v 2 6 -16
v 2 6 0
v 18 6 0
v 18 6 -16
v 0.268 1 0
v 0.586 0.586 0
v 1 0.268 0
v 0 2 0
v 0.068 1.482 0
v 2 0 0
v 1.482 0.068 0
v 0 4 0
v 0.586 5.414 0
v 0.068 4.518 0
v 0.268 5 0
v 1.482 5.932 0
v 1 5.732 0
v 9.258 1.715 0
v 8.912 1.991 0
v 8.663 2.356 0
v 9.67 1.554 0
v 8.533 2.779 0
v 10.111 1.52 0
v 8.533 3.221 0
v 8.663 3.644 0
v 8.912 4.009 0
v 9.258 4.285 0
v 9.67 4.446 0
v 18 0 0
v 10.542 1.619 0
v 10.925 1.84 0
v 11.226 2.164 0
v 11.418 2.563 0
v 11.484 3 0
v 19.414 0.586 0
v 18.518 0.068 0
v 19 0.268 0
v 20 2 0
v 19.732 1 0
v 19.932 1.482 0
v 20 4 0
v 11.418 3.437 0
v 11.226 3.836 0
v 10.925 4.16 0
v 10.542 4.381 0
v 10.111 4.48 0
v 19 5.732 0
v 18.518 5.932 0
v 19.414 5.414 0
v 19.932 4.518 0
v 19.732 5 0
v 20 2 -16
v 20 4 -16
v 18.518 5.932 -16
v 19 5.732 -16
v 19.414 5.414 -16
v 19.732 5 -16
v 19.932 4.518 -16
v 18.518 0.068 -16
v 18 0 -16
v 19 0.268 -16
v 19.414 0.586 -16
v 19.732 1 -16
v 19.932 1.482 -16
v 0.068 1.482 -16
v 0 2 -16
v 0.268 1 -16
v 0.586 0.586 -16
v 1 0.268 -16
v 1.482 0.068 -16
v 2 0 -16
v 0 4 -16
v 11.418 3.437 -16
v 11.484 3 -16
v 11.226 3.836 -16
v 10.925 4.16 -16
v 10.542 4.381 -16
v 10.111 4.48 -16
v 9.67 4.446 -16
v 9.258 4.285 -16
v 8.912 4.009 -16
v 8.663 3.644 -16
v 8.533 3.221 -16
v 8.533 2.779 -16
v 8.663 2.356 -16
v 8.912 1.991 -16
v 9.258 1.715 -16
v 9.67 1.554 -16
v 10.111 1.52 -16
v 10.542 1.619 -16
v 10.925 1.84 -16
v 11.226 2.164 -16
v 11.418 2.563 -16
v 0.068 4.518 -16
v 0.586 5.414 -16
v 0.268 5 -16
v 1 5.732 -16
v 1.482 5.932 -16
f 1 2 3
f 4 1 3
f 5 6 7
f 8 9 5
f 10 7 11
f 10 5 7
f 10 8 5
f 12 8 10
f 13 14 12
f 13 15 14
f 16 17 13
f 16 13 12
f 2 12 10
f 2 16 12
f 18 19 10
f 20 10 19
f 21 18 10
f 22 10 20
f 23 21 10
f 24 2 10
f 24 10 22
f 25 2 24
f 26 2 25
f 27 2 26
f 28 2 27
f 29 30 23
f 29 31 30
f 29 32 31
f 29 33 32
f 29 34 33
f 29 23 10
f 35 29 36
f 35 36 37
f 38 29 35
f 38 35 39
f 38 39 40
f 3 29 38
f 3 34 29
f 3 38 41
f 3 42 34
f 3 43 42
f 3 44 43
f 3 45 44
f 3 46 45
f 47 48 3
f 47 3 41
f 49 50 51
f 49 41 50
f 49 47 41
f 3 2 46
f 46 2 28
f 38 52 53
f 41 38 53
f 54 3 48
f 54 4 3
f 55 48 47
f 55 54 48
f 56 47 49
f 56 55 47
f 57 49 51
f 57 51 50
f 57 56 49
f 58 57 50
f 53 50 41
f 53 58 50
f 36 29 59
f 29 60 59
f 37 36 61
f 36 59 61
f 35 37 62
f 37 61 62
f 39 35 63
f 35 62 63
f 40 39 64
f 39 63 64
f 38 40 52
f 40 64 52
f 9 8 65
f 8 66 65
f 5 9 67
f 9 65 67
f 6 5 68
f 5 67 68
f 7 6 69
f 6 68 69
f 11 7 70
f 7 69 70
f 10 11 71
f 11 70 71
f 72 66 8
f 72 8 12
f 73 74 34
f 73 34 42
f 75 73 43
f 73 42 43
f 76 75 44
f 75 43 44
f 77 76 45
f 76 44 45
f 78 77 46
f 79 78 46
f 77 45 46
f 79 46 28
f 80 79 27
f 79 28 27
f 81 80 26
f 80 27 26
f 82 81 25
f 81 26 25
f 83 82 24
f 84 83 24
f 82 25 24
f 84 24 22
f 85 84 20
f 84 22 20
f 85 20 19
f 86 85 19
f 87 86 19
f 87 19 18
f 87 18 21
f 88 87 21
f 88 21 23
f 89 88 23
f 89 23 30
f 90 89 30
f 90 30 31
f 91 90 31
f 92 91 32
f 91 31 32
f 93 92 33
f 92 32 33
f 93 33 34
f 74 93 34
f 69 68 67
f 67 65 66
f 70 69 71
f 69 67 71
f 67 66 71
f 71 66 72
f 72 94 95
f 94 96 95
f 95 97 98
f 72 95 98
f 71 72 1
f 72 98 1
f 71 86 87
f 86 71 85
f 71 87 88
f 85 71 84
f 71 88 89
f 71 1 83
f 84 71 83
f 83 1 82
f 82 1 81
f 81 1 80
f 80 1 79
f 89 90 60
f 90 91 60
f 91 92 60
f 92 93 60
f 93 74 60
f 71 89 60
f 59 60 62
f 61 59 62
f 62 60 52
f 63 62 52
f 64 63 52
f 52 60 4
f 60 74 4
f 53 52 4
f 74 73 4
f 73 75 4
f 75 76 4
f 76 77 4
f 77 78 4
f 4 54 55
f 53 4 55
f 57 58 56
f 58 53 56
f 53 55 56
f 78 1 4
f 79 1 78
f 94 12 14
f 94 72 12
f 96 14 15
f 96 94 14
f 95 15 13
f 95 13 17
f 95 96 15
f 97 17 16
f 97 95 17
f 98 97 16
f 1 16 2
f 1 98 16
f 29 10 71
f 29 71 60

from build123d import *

# Parameters (mm, degrees)
F0_W     = 20
F0_H     = 6
F0_R     = 1.483649
F1_DEPTH = 16
F2_R     = 2


with BuildPart() as f1:
    # F0 (on Top) → F1 (new body)
    with BuildSketch(Plane.XY):
        with Locations((10, 3)):
            Rectangle(F0_W, F0_H)
        with Locations((10, 3)):
            Circle(F0_R, mode=Mode.SUBTRACT)
    extrude(amount=-F1_DEPTH)

    # F2
    f2_edges = [f1.edges().sort_by_distance(p)[0] for p in [
        (20, 6, -8),
        (0, 6, -8),
        (20, 0, -8),
        (0, 0, -8),
    ]]
    fillet(f2_edges, radius=F2_R)


solid = f1.part
